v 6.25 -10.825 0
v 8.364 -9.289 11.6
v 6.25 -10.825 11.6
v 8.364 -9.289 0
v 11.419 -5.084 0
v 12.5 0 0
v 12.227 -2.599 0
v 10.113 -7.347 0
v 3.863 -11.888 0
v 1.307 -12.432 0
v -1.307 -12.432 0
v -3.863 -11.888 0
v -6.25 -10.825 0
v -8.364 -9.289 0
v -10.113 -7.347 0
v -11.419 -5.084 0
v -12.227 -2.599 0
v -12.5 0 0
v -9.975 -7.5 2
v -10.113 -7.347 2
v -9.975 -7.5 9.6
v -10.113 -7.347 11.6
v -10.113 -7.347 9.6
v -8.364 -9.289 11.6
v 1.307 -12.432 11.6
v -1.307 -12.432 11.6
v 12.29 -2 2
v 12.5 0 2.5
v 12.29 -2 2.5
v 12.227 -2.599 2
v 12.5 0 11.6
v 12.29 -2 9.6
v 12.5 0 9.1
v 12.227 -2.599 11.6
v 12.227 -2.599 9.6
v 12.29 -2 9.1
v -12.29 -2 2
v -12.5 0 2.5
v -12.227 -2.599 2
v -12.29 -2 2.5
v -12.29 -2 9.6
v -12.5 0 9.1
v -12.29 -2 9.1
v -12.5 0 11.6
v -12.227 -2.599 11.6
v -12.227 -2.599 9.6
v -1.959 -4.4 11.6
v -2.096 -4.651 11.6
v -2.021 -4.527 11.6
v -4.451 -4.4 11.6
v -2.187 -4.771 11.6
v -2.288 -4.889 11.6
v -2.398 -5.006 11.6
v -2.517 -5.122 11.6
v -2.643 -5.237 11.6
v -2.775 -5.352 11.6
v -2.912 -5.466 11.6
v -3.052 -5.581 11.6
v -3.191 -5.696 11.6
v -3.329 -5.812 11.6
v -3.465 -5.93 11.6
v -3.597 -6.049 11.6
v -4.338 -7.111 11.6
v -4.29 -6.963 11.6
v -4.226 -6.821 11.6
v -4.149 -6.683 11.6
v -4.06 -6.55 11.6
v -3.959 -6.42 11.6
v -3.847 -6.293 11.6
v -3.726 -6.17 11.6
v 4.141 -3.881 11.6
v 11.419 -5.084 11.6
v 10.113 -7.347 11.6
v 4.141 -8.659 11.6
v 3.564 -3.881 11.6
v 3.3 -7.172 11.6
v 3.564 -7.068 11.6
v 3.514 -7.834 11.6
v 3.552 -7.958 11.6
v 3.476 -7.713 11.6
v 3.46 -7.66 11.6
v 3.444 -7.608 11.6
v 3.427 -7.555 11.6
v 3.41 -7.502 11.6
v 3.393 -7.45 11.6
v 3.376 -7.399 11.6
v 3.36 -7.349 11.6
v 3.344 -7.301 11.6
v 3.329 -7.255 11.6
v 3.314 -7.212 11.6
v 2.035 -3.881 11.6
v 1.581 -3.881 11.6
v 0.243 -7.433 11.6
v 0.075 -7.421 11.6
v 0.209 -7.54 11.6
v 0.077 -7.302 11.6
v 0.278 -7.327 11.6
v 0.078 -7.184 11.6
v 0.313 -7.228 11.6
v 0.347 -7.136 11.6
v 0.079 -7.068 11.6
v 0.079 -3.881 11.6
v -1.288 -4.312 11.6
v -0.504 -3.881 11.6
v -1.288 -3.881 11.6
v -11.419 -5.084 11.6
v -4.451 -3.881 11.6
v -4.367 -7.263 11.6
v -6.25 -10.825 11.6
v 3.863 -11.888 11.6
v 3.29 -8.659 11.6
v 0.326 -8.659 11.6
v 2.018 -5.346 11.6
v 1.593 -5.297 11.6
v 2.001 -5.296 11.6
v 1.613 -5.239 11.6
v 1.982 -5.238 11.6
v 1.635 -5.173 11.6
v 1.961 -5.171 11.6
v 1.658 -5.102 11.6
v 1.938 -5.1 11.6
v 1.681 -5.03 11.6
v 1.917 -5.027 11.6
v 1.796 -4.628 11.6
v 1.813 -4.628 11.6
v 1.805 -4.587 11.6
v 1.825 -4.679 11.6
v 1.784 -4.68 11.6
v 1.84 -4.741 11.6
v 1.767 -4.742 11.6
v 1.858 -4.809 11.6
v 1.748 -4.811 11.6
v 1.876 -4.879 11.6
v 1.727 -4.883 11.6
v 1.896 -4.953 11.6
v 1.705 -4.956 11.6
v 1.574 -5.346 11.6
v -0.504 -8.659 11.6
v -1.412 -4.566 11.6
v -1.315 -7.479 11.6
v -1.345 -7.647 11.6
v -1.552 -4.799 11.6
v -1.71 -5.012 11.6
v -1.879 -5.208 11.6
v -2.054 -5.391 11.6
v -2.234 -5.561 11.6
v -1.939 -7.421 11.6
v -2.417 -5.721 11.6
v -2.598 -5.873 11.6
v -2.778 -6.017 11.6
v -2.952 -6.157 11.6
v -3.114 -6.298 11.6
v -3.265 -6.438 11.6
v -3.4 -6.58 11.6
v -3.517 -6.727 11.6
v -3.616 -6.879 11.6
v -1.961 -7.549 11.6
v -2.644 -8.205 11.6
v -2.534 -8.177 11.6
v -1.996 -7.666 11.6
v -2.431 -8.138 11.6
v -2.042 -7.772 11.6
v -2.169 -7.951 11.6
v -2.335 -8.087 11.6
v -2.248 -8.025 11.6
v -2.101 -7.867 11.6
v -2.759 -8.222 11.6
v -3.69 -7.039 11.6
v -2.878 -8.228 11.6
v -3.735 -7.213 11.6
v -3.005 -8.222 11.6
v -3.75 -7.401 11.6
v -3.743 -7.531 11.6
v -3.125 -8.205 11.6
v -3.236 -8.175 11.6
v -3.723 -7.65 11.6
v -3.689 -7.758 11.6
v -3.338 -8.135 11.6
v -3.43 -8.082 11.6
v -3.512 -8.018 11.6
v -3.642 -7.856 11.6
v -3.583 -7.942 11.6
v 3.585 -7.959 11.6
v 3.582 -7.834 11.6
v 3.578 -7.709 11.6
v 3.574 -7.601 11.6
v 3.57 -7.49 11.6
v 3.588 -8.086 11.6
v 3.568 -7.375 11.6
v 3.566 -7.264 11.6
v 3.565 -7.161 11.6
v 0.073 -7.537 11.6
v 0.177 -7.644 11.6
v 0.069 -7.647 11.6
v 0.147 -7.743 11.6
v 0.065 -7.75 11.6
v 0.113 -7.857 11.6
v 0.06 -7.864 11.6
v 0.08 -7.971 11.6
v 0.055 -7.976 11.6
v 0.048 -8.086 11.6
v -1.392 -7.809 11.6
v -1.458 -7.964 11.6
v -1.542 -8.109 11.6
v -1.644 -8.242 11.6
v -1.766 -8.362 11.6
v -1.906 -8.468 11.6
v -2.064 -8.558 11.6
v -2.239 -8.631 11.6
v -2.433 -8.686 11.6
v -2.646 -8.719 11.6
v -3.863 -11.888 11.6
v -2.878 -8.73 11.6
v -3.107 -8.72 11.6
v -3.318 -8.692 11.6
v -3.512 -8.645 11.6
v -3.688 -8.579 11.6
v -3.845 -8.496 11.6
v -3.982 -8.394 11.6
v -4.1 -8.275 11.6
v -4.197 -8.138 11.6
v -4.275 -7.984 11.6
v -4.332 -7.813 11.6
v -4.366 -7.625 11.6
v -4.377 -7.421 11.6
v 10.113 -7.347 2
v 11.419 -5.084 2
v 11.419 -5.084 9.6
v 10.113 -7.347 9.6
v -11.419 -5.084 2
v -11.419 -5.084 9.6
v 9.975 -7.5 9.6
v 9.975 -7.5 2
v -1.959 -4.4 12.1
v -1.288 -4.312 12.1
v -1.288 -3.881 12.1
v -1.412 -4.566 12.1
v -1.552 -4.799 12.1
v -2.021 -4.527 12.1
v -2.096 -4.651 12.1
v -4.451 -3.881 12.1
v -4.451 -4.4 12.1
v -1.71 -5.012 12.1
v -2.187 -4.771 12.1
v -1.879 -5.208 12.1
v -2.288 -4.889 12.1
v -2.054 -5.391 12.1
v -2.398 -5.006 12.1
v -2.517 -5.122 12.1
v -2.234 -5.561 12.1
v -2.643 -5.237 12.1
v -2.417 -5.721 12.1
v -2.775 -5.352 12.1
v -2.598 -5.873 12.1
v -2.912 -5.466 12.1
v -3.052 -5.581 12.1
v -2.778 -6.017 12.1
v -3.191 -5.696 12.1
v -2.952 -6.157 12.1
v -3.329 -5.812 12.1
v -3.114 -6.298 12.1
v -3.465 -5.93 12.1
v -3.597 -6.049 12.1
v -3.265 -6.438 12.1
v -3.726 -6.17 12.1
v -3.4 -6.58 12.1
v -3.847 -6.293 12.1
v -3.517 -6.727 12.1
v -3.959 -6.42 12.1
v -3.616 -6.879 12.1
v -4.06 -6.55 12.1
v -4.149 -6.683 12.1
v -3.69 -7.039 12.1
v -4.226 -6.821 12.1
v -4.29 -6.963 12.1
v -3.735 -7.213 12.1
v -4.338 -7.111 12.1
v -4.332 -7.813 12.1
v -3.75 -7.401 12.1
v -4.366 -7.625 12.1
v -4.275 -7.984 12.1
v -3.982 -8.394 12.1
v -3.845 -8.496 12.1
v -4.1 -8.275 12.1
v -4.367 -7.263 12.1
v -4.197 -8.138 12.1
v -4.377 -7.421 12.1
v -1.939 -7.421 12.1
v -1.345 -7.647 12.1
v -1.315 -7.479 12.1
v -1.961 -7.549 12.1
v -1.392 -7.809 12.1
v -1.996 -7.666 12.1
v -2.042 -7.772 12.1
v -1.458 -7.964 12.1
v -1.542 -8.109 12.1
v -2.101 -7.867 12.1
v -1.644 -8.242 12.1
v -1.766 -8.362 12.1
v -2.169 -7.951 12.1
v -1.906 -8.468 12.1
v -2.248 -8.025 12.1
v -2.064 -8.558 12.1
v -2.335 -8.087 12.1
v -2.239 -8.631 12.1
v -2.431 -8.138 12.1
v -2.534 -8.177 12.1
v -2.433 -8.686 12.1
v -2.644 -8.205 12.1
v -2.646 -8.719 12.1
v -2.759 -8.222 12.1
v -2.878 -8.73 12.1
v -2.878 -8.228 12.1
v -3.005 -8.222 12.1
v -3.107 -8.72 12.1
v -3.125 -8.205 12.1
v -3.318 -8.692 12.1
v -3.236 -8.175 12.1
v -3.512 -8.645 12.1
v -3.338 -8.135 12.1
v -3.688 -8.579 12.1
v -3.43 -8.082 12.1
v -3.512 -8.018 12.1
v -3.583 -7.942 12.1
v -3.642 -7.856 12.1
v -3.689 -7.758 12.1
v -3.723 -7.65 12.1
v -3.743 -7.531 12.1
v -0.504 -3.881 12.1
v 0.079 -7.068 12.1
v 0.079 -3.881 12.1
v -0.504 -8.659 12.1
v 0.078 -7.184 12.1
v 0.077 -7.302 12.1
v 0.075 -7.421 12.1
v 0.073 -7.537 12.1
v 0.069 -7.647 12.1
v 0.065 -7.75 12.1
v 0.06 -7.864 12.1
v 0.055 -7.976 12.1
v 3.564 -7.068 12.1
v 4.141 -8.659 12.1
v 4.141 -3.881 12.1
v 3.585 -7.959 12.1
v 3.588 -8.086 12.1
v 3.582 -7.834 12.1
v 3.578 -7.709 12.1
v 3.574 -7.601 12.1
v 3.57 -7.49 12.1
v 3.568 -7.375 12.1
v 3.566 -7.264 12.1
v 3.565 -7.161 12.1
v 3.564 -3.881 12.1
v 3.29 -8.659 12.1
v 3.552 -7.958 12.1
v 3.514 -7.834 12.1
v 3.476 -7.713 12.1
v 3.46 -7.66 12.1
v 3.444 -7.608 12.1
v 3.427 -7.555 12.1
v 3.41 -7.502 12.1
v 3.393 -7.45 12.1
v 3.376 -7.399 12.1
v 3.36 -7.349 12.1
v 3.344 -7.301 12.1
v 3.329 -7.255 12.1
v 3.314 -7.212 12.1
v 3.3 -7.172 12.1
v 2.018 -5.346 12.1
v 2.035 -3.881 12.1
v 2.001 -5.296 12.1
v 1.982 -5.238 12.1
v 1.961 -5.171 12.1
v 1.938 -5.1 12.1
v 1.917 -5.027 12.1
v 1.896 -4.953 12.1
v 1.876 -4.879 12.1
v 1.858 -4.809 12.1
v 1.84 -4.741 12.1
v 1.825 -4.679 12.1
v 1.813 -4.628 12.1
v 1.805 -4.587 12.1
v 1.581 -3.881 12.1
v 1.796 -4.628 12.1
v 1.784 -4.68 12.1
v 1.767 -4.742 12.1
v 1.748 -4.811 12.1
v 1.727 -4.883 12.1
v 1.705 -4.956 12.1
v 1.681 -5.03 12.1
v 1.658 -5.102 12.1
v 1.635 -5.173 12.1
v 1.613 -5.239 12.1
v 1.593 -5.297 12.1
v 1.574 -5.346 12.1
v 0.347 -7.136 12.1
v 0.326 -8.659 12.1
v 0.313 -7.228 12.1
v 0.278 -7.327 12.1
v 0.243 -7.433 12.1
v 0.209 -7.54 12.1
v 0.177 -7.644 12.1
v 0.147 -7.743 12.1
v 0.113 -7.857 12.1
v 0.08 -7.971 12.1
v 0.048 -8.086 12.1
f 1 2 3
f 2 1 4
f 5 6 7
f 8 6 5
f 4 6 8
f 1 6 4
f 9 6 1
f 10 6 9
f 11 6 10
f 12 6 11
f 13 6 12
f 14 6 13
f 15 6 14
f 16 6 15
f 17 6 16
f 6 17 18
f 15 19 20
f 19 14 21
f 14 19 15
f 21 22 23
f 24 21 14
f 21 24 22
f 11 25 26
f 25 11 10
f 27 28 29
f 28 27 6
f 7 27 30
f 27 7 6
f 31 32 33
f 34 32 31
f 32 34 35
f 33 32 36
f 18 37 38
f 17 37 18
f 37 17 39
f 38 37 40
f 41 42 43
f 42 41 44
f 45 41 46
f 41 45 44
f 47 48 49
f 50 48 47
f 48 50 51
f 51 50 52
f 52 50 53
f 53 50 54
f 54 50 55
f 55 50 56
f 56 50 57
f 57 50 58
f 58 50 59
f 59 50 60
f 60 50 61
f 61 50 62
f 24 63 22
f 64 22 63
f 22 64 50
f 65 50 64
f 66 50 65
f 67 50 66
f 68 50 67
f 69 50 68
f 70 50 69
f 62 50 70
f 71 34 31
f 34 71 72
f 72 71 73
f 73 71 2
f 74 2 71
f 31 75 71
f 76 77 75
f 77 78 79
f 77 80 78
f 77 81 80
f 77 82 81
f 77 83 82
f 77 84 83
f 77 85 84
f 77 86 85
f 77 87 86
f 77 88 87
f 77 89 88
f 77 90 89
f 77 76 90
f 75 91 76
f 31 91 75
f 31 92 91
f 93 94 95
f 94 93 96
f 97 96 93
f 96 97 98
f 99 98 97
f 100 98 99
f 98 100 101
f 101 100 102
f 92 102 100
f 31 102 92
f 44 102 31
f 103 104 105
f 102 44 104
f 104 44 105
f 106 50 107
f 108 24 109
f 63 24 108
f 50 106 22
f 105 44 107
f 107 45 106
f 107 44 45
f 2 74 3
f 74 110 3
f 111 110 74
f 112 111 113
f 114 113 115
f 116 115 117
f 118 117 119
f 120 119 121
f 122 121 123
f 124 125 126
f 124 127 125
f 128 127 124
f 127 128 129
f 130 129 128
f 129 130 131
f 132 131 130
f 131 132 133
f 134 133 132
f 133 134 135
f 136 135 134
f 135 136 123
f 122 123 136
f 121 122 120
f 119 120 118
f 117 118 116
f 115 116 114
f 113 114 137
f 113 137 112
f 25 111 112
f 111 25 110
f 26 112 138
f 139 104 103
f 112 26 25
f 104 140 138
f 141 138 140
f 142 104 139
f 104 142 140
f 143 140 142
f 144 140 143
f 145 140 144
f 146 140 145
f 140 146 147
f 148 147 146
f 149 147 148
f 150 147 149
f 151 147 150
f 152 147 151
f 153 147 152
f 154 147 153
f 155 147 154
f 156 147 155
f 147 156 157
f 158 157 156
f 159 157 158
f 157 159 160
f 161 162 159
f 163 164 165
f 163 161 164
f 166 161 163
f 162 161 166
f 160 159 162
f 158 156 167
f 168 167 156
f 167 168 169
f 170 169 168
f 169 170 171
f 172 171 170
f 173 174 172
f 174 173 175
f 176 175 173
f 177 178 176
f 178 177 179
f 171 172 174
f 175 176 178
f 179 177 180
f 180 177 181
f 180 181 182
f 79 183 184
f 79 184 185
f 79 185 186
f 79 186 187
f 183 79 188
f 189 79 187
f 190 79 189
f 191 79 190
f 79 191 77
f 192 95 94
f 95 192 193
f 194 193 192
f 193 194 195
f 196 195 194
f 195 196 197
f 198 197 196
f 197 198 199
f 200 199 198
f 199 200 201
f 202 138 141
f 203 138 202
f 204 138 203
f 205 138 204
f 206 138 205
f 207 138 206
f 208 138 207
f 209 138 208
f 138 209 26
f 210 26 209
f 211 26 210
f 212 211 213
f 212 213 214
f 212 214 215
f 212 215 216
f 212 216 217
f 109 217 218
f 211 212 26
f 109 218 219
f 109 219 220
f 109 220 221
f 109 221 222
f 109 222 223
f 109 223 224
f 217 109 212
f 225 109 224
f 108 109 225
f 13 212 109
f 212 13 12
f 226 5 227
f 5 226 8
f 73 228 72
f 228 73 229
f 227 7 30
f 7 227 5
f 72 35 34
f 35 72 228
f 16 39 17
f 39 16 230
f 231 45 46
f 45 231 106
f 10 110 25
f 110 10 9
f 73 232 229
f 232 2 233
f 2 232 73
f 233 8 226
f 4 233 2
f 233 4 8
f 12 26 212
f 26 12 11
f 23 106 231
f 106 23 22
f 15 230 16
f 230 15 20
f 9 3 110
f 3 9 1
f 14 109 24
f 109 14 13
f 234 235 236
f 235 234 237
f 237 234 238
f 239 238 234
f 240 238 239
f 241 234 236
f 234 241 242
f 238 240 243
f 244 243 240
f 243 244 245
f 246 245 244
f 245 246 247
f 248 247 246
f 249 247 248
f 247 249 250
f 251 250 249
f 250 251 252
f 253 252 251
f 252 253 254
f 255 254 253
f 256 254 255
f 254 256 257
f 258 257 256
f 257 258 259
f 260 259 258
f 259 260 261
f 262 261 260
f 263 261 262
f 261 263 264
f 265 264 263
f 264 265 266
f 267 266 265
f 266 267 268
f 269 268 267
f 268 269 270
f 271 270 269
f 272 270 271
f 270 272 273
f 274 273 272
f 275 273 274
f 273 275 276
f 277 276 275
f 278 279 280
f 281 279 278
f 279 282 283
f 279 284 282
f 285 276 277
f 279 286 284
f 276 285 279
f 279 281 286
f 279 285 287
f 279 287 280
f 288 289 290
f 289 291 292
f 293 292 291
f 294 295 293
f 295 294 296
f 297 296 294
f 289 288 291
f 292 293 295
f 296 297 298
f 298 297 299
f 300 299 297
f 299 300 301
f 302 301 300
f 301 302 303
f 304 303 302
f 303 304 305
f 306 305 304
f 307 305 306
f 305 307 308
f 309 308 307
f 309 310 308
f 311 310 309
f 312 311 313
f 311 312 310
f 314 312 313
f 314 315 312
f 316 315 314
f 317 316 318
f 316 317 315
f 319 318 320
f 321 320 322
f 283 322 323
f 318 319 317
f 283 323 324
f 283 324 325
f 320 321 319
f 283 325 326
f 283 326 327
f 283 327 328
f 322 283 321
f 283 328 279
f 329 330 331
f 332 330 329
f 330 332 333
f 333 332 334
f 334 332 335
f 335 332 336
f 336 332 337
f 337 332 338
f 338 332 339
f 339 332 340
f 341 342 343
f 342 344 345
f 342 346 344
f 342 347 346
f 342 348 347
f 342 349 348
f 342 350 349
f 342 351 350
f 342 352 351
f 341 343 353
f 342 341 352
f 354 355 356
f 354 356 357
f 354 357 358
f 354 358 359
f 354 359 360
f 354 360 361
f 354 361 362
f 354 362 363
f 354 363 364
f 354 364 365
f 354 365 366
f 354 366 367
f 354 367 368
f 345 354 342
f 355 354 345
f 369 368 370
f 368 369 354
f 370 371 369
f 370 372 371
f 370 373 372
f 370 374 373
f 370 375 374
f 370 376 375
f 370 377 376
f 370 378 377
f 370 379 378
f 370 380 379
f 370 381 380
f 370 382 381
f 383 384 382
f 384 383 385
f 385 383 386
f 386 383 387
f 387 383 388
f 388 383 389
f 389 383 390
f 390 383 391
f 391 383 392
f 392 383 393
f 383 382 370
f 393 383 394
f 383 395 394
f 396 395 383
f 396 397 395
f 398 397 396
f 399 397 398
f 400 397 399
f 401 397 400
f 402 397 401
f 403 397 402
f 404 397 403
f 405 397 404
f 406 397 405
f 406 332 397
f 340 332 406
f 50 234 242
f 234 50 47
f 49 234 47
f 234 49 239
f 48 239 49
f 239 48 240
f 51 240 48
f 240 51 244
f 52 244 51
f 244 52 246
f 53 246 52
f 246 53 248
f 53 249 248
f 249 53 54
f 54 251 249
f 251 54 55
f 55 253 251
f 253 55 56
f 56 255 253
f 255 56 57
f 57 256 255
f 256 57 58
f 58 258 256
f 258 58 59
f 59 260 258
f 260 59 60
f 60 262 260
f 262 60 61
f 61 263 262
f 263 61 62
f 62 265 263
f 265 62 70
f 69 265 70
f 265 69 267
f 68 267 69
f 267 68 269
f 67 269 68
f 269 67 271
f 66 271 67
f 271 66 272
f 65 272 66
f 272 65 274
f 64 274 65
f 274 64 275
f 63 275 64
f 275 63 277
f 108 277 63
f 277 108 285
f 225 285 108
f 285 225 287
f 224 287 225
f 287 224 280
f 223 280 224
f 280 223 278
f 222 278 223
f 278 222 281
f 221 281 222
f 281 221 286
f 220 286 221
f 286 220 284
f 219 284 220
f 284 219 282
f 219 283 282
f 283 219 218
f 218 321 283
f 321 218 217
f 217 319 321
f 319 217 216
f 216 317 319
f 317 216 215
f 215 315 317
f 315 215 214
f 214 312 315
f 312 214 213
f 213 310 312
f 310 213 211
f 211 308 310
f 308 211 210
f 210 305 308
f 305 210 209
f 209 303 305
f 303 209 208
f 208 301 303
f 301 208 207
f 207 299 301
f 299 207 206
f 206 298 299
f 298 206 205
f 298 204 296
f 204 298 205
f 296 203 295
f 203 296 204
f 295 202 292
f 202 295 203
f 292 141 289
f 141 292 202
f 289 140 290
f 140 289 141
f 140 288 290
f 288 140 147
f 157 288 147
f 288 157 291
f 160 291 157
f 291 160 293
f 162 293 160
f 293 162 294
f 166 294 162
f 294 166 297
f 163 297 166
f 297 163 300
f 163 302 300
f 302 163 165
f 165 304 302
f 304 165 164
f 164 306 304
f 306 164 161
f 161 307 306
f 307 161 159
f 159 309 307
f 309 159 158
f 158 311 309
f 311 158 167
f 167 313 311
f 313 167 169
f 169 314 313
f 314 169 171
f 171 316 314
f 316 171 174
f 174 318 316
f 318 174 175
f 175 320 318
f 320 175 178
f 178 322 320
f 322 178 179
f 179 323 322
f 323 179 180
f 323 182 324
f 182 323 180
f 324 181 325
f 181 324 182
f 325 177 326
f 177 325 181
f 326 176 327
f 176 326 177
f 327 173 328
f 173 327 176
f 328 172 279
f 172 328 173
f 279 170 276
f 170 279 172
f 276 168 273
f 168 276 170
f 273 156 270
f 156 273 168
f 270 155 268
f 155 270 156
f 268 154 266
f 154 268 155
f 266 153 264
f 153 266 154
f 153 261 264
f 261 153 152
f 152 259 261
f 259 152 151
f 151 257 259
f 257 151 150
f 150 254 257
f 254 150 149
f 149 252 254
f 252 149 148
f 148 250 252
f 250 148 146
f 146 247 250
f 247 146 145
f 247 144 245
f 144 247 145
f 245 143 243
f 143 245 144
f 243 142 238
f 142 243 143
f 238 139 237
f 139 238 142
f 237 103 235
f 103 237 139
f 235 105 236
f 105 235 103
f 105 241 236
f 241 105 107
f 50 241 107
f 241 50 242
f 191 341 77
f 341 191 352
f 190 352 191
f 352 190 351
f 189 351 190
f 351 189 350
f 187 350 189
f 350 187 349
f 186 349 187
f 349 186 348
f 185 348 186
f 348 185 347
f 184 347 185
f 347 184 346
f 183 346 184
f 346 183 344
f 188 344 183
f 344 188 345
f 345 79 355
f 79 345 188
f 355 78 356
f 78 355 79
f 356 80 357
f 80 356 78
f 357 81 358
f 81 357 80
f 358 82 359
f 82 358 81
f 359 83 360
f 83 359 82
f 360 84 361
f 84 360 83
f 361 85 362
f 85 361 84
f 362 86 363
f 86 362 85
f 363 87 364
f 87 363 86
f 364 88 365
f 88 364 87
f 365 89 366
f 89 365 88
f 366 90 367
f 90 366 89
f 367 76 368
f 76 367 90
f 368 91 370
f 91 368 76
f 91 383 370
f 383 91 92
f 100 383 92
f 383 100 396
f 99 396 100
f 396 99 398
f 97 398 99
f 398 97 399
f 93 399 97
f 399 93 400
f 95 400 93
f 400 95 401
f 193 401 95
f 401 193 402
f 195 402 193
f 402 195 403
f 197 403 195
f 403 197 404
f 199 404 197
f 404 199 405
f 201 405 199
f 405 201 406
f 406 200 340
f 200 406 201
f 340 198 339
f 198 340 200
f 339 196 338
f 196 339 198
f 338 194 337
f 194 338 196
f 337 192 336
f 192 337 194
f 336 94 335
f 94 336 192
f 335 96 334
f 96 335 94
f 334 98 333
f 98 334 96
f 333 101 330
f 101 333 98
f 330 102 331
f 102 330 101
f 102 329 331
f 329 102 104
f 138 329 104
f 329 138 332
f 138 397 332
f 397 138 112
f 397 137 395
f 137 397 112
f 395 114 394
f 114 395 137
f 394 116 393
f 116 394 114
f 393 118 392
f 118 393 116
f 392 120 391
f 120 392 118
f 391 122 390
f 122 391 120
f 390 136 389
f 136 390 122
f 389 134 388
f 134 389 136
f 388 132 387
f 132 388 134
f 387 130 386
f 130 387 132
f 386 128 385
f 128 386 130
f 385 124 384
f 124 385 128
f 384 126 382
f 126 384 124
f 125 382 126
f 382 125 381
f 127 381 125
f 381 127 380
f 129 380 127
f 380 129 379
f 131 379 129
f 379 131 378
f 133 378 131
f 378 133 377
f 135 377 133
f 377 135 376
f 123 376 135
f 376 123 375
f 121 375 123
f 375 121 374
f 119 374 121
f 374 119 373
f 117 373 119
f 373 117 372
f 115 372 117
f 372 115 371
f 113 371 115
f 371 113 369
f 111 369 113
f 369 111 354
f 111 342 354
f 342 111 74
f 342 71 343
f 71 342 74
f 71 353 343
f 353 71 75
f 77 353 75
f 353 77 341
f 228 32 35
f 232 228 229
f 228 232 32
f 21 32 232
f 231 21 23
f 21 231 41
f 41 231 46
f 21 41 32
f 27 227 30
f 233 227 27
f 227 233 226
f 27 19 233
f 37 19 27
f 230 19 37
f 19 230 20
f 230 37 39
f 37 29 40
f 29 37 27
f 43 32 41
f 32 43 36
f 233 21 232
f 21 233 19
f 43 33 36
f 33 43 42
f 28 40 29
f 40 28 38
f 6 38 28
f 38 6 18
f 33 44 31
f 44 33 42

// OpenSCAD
//The height of the bed (mm)
bed_height=7.6; 

//Diameter of the circle (mm)
diameter= 25; // [10:50]

//The depth of the rift
rift=0.6; // [0.1:0.1:0.9]

//The thickness of the clamp (mm)
clampheight=2; // [1:0.1:5]

//The thickness of the claw (mm)
clawheight=0.5; // [0:0.1:1.5]

//The width of the claw (mm)
clawwidth= 2; // [1:0.1:5]


/* [Advanced] */

text="M2";
font = "Liberation Sans";
letter_size = 5; 
letter_height = 0.5; //mm





height= bed_height+clampheight*2;
radius = diameter/2;



module letter(l) {
  // Use linear_extrude() to make the letters 3D objects as they
  // are only 2D shapes when only using text()
  linear_extrude(height = letter_height+height) {
    text(l, size = letter_size, font = font, halign = "center", valign = "center", $fn = 16);
  }
}


 
difference()
{
    union()
    {
 color("gray") cylinder(height,radius,radius,false );
 color("red")    translate([0, -radius/2, 0]) rotate([0, 0, 180]) letter(text);
    }

translate([-radius,0,0])
cube([diameter,radius,height]);


union()
{
translate([-radius,-radius*rift,(height-bed_height)/2])
cube([diameter, radius*rift-clawwidth,bed_height]);

translate([-radius,-radius*rift,(height-bed_height+clawheight*2)/2])
cube([diameter, radius*rift,bed_height-clawheight*2]);
}

}
